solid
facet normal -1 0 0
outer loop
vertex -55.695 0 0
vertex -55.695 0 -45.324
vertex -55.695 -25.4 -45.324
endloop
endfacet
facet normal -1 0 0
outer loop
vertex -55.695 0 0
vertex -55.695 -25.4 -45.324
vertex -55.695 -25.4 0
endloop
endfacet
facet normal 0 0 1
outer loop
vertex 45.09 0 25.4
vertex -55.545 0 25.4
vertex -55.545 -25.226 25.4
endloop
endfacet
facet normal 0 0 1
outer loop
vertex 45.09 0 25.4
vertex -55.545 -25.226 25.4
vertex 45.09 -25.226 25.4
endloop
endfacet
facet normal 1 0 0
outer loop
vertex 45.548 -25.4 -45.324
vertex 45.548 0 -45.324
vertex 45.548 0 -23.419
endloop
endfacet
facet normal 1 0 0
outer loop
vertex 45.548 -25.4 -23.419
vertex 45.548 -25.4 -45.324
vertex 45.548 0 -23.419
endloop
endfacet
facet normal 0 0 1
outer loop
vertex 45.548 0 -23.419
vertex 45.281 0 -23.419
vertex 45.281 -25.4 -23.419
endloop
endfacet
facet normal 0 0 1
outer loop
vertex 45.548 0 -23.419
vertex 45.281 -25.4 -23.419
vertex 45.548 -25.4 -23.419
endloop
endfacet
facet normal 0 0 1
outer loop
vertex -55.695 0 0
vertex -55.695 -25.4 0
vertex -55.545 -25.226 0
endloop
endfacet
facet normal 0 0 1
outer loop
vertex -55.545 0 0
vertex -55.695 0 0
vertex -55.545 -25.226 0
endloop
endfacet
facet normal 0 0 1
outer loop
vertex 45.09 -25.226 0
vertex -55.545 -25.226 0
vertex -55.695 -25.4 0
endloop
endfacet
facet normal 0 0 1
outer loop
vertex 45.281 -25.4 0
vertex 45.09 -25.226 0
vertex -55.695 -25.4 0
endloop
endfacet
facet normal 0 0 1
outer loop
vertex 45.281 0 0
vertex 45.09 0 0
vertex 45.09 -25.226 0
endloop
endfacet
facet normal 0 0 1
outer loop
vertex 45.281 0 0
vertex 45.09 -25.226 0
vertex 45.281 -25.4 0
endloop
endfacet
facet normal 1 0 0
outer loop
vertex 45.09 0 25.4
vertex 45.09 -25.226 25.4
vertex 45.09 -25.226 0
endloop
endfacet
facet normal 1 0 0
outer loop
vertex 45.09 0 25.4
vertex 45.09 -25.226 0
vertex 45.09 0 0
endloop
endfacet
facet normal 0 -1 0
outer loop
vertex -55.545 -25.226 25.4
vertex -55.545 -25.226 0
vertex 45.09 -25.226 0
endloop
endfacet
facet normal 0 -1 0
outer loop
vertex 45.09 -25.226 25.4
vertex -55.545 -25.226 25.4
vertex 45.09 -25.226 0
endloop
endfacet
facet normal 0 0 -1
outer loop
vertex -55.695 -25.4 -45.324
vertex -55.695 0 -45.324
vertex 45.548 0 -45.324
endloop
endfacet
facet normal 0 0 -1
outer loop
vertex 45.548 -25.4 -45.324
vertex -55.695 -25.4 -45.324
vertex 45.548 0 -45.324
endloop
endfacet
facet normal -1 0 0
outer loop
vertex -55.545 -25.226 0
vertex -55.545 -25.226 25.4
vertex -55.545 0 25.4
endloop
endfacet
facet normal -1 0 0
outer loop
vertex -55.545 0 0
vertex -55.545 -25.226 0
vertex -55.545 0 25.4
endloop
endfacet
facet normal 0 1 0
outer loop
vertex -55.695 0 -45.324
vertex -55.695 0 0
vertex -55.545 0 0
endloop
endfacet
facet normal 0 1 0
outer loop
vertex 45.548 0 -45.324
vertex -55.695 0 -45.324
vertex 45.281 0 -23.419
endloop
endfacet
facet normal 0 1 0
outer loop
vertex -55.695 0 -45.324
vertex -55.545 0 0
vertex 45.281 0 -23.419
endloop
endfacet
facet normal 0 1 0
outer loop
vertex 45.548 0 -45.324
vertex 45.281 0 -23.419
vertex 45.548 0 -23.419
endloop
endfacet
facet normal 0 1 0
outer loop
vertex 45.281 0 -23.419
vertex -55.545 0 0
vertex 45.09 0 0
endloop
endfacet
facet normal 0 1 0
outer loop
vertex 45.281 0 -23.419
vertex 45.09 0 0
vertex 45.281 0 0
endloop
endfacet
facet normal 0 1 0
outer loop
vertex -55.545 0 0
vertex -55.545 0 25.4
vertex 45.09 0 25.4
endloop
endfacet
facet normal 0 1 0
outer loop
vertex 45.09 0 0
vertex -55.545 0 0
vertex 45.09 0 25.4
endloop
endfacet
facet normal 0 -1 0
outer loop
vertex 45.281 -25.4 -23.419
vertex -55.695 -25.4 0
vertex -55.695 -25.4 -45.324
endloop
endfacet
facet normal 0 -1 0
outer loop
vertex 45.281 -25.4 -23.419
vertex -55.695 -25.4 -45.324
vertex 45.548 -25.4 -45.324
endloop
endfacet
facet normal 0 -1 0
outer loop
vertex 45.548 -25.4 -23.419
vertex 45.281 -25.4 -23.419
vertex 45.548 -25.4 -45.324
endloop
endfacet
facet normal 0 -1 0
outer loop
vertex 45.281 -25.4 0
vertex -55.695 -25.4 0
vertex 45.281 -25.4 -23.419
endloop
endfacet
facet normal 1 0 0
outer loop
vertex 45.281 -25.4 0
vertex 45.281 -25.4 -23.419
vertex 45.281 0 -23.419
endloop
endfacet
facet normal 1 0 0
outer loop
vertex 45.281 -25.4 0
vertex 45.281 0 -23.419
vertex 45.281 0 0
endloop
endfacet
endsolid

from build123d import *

# Parameters (mm, degrees)
F2_W     = 100.6348691881
F2_H     = 25.2255089581
F3_DEPTH = 25.4
F4_W     = 100.976370275
F4_H     = 23.4190355986
F5_DEPTH = 25.4
F8_W     = 101.243507117
F8_H     = 21.9049286097
F9_DEPTH = 25.4


# Not quite as in the source:
# - the program builds the solid bodies; features that only make, move or delete a surface that nothing else refers to are left out


with BuildPart() as f3:
    # F2 (on Top) → F3 (new body)
    with BuildSketch(Plane.XY):
        with Locations((-5.2274335176, -12.6127544791)):
            Rectangle(F2_W, F2_H)
    extrude(amount=F3_DEPTH)

    # F4 (on Front) → F5 (join)
    with BuildSketch(Plane.XZ):
        with Locations((-5.2071809769, -11.7095177993)):
            Rectangle(F4_W, F4_H)
    extrude(amount=F5_DEPTH)

    # F8 (on Front) → F9 (join)
    with BuildSketch(Plane.XZ):
        with Locations((-5.0736125559, -34.3714999035)):
            Rectangle(F8_W, F8_H)
    extrude(amount=F9_DEPTH)


solid = f3.part
